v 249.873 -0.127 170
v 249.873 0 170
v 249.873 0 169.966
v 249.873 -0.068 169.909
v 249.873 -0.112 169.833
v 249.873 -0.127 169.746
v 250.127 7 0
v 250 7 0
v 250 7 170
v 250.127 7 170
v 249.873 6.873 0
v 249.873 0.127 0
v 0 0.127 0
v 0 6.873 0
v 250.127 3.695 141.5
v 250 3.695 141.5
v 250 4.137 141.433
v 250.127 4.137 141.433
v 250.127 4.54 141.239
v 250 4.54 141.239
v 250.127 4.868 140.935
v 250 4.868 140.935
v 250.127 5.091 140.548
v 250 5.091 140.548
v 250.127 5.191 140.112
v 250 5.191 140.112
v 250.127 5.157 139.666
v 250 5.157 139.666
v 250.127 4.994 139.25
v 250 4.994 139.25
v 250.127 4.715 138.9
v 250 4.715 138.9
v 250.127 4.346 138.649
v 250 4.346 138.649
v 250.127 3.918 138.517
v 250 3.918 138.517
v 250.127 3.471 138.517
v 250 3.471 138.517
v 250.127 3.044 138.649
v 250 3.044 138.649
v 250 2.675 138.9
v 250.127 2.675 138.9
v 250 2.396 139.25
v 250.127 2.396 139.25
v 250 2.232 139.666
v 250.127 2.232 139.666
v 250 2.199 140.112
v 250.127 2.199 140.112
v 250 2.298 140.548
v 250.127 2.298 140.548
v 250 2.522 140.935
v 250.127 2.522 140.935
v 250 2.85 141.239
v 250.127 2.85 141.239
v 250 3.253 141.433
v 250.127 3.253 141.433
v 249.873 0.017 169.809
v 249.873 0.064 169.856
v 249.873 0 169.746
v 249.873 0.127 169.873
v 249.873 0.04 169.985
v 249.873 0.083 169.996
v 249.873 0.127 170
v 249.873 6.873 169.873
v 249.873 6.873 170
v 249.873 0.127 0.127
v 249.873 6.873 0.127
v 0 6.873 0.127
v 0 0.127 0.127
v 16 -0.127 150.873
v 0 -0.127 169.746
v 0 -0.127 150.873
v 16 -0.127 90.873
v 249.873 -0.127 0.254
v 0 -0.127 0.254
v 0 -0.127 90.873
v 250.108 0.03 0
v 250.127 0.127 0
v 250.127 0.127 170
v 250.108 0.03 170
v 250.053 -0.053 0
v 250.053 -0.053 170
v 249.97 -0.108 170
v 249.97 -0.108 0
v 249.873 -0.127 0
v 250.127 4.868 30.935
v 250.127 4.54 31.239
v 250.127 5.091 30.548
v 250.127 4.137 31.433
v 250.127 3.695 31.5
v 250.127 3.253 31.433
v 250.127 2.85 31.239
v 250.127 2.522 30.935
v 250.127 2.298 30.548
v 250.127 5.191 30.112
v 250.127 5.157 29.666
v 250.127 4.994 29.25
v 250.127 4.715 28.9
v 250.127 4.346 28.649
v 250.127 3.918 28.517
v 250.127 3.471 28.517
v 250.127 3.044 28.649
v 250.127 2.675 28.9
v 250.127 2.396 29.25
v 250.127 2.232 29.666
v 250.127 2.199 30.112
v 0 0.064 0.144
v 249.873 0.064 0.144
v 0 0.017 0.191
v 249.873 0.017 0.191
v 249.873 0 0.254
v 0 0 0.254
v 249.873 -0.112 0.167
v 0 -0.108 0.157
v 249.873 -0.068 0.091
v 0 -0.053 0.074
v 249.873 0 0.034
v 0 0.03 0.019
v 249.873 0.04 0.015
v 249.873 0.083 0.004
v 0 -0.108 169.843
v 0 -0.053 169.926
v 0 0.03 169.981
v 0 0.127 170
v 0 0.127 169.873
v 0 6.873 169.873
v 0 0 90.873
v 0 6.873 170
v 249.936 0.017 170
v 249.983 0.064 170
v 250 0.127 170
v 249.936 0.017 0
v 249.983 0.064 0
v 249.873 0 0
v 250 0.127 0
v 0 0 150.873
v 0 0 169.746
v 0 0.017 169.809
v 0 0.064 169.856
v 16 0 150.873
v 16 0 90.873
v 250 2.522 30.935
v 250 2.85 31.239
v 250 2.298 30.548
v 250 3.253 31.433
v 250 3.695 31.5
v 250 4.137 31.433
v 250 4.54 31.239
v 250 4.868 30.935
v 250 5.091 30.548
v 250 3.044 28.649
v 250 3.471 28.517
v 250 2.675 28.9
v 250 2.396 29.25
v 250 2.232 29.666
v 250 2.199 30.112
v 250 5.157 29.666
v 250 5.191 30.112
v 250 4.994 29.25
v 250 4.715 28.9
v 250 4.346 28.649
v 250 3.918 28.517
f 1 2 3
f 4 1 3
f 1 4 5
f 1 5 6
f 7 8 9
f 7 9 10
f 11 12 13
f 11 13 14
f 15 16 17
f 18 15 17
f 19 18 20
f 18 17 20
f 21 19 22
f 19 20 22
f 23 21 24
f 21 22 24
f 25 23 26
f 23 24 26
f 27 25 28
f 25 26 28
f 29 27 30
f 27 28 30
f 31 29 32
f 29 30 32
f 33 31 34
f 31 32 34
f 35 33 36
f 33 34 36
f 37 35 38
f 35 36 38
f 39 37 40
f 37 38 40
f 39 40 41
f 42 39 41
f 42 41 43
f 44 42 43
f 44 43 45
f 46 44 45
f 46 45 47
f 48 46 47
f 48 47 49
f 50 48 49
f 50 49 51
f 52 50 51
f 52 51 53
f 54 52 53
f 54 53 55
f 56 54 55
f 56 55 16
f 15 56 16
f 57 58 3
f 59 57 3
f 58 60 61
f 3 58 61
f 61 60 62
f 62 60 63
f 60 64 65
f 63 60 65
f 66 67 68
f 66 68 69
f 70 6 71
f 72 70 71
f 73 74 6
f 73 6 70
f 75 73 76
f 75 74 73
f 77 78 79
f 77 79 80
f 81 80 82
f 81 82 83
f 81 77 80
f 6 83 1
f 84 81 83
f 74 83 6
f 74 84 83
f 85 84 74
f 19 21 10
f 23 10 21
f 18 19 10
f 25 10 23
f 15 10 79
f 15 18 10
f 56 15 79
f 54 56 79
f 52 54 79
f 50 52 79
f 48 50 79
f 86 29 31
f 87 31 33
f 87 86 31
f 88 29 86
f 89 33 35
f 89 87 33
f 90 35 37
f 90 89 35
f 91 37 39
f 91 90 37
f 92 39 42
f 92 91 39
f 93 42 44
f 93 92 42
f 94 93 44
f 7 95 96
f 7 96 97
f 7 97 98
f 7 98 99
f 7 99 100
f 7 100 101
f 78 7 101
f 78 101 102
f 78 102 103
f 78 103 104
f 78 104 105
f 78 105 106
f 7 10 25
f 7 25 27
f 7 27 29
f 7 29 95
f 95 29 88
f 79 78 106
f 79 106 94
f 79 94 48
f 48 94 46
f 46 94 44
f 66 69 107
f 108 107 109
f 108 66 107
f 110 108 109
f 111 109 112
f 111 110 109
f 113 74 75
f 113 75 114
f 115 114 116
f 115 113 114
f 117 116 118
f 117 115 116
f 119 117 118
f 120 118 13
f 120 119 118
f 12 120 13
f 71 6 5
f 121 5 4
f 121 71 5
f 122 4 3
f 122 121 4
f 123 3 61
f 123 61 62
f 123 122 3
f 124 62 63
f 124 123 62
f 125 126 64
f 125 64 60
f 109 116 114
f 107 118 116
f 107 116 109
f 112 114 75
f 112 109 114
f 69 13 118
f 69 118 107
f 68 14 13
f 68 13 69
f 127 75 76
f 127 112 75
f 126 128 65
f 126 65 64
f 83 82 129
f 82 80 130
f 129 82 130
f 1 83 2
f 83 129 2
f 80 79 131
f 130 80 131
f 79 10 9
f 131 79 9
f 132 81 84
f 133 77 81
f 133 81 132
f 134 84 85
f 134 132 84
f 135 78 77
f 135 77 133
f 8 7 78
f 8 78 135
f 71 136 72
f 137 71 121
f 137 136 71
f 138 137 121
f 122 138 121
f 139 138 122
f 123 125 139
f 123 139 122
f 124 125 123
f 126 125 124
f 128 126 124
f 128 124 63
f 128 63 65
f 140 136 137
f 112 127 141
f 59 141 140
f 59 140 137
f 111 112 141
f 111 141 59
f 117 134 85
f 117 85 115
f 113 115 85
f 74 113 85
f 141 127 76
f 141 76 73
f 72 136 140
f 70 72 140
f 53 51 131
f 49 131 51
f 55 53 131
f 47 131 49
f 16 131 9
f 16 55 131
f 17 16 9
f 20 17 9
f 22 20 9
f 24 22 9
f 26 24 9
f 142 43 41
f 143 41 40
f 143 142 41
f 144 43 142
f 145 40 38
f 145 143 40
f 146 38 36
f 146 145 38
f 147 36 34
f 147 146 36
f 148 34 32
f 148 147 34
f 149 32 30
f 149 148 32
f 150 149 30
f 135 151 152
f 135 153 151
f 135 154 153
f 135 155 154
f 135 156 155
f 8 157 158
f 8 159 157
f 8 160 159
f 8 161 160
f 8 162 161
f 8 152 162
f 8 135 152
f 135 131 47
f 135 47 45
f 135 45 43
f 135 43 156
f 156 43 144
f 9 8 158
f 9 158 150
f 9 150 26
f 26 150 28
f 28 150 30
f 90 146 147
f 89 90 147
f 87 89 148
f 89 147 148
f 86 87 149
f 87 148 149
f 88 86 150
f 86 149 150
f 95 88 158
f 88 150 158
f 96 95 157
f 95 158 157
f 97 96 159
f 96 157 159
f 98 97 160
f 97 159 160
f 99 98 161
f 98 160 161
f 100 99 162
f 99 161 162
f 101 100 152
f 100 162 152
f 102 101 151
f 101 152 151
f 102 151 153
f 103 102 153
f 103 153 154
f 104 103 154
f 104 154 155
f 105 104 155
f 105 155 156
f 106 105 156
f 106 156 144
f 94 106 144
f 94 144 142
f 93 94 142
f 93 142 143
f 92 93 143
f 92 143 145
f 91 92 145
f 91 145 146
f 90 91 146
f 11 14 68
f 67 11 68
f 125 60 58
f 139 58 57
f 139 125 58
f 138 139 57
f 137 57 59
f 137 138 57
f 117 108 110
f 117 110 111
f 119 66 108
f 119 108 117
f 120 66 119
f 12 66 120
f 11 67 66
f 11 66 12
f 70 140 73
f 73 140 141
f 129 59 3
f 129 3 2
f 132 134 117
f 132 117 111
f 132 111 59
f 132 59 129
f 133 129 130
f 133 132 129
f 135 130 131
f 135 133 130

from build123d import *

# Parameters (mm, degrees)
BASE_FLANGE1_DEPTH             = 170
EDGE_FLANGE1_STRIP_W           = 0.762
EDGE_FLANGE1_STRIP_H           = 0.127
EDGE_FLANGE1_STRIP_CUT_DEPTH   = 249.873
EDGE_FLANGE1_STRIP_2_W         = 0.762
EDGE_FLANGE1_STRIP_2_H         = 0.127
EDGE_FLANGE1_STRIP_CUT_2_DEPTH = 249.873
EDGE_FLANGE1_DEPTH             = 249.873
EDGE_FLANGE1_BEND_DEPTH        = 249.873
SKETCH19_W                     = 16
SKETCH19_H                     = 60
CUT_EXTRUDE1_DEPTH             = 10
SKETCH20_R                     = 1.5
CUT_EXTRUDE2_DEPTH             = 10


# Sheet-metal steps are written as plain solids
with BuildPart() as part:
    # Sketch1 → Base-Flange1 (new body)
    with BuildSketch(Plane.XY):
        with BuildLine():
            Line((0, 0), (249.873, 0))
            ThreePointArc((249.873, 0), (249.962802561, 0.037197439), (250, 0.127))
            Line((250, 0.127), (250, 7))
            Line((250, 7), (250.127, 7))
            Line((250.127, 7), (250.127, 0.127))
            ThreePointArc((250.127, 0.127), (250.052605122, -0.052605122), (249.873, -0.127))
            Line((249.873, -0.127), (0, -0.127))
            Line((0, -0.127), (0, 0))
        make_face()
    extrude(amount=BASE_FLANGE1_DEPTH)

    # Edge-Flange1 strip (across the edge) → Edge-Flange1 strip cut (cut)
    with BuildSketch(Plane.ZY.offset(-249.873)):
        with Locations((-0.127, -0.0635)):
            Rectangle(EDGE_FLANGE1_STRIP_W, EDGE_FLANGE1_STRIP_H)
    extrude(amount=EDGE_FLANGE1_STRIP_CUT_DEPTH, mode=Mode.SUBTRACT)

    # Edge-Flange1 strip 2 (across the edge) → Edge-Flange1 strip cut 2 (cut)
    with BuildSketch(Plane(origin=(0, 0, 170), x_dir=(0, 0, -1), z_dir=(1, 0, 0))):
        with Locations((-0.127, -0.0635)):
            Rectangle(EDGE_FLANGE1_STRIP_2_W, EDGE_FLANGE1_STRIP_2_H)
    extrude(amount=EDGE_FLANGE1_STRIP_CUT_2_DEPTH, mode=Mode.SUBTRACT)

    # Edge-Flange1 section (across the edge) → Edge-Flange1 (add)
    with BuildSketch(Plane.ZY.offset(-249.873)):
        with BuildLine():
            Line((0, 0.127), (0, 6.873))
            Line((0, 6.873), (0.127, 6.873))
            Line((0.127, 6.873), (0.127, 0.127))
            ThreePointArc((0.127, 0.127), (0.164197439, 0.037197439), (0.254, 0))
            Line((0.254, 0), (0.254, -0.127))
            ThreePointArc((0.254, -0.127), (0.074394878, -0.052605122), (0, 0.127))
        make_face()
    extrude(amount=EDGE_FLANGE1_DEPTH)

    # Edge-Flange1 section 2 (across the edge) → Edge-Flange1 bend (add)
    with BuildSketch(Plane(origin=(0, 0, 170), x_dir=(0, 0, -1), z_dir=(1, 0, 0))):
        with BuildLine():
            Line((0, 0.127), (0, 6.873))
            Line((0, 6.873), (0.127, 6.873))
            Line((0.127, 6.873), (0.127, 0.127))
            ThreePointArc((0.127, 0.127), (0.164197439, 0.037197439), (0.254, 0))
            Line((0.254, 0), (0.254, -0.127))
            ThreePointArc((0.254, -0.127), (0.074394878, -0.052605122), (0, 0.127))
        make_face()
    extrude(amount=EDGE_FLANGE1_BEND_DEPTH)

    # Sketch19 → Cut-Extrude1 (cut)
    with BuildSketch(Plane(origin=(0, 0, 0), x_dir=(1, 0, 0), z_dir=(0, 1, 0))):
        with Locations((8, -120.873)):
            Rectangle(SKETCH19_W, SKETCH19_H)
    extrude(amount=-CUT_EXTRUDE1_DEPTH, mode=Mode.SUBTRACT)

    # Sketch20 → Cut-Extrude2 (cut)
    with BuildSketch(Plane.ZY.offset(-250)):
        with Locations((30, 3.694801823)):
            Circle(SKETCH20_R)
        with Locations((140, 3.694801823)):
            Circle(SKETCH20_R)
    extrude(amount=-CUT_EXTRUDE2_DEPTH, mode=Mode.SUBTRACT)


solid = part.part
